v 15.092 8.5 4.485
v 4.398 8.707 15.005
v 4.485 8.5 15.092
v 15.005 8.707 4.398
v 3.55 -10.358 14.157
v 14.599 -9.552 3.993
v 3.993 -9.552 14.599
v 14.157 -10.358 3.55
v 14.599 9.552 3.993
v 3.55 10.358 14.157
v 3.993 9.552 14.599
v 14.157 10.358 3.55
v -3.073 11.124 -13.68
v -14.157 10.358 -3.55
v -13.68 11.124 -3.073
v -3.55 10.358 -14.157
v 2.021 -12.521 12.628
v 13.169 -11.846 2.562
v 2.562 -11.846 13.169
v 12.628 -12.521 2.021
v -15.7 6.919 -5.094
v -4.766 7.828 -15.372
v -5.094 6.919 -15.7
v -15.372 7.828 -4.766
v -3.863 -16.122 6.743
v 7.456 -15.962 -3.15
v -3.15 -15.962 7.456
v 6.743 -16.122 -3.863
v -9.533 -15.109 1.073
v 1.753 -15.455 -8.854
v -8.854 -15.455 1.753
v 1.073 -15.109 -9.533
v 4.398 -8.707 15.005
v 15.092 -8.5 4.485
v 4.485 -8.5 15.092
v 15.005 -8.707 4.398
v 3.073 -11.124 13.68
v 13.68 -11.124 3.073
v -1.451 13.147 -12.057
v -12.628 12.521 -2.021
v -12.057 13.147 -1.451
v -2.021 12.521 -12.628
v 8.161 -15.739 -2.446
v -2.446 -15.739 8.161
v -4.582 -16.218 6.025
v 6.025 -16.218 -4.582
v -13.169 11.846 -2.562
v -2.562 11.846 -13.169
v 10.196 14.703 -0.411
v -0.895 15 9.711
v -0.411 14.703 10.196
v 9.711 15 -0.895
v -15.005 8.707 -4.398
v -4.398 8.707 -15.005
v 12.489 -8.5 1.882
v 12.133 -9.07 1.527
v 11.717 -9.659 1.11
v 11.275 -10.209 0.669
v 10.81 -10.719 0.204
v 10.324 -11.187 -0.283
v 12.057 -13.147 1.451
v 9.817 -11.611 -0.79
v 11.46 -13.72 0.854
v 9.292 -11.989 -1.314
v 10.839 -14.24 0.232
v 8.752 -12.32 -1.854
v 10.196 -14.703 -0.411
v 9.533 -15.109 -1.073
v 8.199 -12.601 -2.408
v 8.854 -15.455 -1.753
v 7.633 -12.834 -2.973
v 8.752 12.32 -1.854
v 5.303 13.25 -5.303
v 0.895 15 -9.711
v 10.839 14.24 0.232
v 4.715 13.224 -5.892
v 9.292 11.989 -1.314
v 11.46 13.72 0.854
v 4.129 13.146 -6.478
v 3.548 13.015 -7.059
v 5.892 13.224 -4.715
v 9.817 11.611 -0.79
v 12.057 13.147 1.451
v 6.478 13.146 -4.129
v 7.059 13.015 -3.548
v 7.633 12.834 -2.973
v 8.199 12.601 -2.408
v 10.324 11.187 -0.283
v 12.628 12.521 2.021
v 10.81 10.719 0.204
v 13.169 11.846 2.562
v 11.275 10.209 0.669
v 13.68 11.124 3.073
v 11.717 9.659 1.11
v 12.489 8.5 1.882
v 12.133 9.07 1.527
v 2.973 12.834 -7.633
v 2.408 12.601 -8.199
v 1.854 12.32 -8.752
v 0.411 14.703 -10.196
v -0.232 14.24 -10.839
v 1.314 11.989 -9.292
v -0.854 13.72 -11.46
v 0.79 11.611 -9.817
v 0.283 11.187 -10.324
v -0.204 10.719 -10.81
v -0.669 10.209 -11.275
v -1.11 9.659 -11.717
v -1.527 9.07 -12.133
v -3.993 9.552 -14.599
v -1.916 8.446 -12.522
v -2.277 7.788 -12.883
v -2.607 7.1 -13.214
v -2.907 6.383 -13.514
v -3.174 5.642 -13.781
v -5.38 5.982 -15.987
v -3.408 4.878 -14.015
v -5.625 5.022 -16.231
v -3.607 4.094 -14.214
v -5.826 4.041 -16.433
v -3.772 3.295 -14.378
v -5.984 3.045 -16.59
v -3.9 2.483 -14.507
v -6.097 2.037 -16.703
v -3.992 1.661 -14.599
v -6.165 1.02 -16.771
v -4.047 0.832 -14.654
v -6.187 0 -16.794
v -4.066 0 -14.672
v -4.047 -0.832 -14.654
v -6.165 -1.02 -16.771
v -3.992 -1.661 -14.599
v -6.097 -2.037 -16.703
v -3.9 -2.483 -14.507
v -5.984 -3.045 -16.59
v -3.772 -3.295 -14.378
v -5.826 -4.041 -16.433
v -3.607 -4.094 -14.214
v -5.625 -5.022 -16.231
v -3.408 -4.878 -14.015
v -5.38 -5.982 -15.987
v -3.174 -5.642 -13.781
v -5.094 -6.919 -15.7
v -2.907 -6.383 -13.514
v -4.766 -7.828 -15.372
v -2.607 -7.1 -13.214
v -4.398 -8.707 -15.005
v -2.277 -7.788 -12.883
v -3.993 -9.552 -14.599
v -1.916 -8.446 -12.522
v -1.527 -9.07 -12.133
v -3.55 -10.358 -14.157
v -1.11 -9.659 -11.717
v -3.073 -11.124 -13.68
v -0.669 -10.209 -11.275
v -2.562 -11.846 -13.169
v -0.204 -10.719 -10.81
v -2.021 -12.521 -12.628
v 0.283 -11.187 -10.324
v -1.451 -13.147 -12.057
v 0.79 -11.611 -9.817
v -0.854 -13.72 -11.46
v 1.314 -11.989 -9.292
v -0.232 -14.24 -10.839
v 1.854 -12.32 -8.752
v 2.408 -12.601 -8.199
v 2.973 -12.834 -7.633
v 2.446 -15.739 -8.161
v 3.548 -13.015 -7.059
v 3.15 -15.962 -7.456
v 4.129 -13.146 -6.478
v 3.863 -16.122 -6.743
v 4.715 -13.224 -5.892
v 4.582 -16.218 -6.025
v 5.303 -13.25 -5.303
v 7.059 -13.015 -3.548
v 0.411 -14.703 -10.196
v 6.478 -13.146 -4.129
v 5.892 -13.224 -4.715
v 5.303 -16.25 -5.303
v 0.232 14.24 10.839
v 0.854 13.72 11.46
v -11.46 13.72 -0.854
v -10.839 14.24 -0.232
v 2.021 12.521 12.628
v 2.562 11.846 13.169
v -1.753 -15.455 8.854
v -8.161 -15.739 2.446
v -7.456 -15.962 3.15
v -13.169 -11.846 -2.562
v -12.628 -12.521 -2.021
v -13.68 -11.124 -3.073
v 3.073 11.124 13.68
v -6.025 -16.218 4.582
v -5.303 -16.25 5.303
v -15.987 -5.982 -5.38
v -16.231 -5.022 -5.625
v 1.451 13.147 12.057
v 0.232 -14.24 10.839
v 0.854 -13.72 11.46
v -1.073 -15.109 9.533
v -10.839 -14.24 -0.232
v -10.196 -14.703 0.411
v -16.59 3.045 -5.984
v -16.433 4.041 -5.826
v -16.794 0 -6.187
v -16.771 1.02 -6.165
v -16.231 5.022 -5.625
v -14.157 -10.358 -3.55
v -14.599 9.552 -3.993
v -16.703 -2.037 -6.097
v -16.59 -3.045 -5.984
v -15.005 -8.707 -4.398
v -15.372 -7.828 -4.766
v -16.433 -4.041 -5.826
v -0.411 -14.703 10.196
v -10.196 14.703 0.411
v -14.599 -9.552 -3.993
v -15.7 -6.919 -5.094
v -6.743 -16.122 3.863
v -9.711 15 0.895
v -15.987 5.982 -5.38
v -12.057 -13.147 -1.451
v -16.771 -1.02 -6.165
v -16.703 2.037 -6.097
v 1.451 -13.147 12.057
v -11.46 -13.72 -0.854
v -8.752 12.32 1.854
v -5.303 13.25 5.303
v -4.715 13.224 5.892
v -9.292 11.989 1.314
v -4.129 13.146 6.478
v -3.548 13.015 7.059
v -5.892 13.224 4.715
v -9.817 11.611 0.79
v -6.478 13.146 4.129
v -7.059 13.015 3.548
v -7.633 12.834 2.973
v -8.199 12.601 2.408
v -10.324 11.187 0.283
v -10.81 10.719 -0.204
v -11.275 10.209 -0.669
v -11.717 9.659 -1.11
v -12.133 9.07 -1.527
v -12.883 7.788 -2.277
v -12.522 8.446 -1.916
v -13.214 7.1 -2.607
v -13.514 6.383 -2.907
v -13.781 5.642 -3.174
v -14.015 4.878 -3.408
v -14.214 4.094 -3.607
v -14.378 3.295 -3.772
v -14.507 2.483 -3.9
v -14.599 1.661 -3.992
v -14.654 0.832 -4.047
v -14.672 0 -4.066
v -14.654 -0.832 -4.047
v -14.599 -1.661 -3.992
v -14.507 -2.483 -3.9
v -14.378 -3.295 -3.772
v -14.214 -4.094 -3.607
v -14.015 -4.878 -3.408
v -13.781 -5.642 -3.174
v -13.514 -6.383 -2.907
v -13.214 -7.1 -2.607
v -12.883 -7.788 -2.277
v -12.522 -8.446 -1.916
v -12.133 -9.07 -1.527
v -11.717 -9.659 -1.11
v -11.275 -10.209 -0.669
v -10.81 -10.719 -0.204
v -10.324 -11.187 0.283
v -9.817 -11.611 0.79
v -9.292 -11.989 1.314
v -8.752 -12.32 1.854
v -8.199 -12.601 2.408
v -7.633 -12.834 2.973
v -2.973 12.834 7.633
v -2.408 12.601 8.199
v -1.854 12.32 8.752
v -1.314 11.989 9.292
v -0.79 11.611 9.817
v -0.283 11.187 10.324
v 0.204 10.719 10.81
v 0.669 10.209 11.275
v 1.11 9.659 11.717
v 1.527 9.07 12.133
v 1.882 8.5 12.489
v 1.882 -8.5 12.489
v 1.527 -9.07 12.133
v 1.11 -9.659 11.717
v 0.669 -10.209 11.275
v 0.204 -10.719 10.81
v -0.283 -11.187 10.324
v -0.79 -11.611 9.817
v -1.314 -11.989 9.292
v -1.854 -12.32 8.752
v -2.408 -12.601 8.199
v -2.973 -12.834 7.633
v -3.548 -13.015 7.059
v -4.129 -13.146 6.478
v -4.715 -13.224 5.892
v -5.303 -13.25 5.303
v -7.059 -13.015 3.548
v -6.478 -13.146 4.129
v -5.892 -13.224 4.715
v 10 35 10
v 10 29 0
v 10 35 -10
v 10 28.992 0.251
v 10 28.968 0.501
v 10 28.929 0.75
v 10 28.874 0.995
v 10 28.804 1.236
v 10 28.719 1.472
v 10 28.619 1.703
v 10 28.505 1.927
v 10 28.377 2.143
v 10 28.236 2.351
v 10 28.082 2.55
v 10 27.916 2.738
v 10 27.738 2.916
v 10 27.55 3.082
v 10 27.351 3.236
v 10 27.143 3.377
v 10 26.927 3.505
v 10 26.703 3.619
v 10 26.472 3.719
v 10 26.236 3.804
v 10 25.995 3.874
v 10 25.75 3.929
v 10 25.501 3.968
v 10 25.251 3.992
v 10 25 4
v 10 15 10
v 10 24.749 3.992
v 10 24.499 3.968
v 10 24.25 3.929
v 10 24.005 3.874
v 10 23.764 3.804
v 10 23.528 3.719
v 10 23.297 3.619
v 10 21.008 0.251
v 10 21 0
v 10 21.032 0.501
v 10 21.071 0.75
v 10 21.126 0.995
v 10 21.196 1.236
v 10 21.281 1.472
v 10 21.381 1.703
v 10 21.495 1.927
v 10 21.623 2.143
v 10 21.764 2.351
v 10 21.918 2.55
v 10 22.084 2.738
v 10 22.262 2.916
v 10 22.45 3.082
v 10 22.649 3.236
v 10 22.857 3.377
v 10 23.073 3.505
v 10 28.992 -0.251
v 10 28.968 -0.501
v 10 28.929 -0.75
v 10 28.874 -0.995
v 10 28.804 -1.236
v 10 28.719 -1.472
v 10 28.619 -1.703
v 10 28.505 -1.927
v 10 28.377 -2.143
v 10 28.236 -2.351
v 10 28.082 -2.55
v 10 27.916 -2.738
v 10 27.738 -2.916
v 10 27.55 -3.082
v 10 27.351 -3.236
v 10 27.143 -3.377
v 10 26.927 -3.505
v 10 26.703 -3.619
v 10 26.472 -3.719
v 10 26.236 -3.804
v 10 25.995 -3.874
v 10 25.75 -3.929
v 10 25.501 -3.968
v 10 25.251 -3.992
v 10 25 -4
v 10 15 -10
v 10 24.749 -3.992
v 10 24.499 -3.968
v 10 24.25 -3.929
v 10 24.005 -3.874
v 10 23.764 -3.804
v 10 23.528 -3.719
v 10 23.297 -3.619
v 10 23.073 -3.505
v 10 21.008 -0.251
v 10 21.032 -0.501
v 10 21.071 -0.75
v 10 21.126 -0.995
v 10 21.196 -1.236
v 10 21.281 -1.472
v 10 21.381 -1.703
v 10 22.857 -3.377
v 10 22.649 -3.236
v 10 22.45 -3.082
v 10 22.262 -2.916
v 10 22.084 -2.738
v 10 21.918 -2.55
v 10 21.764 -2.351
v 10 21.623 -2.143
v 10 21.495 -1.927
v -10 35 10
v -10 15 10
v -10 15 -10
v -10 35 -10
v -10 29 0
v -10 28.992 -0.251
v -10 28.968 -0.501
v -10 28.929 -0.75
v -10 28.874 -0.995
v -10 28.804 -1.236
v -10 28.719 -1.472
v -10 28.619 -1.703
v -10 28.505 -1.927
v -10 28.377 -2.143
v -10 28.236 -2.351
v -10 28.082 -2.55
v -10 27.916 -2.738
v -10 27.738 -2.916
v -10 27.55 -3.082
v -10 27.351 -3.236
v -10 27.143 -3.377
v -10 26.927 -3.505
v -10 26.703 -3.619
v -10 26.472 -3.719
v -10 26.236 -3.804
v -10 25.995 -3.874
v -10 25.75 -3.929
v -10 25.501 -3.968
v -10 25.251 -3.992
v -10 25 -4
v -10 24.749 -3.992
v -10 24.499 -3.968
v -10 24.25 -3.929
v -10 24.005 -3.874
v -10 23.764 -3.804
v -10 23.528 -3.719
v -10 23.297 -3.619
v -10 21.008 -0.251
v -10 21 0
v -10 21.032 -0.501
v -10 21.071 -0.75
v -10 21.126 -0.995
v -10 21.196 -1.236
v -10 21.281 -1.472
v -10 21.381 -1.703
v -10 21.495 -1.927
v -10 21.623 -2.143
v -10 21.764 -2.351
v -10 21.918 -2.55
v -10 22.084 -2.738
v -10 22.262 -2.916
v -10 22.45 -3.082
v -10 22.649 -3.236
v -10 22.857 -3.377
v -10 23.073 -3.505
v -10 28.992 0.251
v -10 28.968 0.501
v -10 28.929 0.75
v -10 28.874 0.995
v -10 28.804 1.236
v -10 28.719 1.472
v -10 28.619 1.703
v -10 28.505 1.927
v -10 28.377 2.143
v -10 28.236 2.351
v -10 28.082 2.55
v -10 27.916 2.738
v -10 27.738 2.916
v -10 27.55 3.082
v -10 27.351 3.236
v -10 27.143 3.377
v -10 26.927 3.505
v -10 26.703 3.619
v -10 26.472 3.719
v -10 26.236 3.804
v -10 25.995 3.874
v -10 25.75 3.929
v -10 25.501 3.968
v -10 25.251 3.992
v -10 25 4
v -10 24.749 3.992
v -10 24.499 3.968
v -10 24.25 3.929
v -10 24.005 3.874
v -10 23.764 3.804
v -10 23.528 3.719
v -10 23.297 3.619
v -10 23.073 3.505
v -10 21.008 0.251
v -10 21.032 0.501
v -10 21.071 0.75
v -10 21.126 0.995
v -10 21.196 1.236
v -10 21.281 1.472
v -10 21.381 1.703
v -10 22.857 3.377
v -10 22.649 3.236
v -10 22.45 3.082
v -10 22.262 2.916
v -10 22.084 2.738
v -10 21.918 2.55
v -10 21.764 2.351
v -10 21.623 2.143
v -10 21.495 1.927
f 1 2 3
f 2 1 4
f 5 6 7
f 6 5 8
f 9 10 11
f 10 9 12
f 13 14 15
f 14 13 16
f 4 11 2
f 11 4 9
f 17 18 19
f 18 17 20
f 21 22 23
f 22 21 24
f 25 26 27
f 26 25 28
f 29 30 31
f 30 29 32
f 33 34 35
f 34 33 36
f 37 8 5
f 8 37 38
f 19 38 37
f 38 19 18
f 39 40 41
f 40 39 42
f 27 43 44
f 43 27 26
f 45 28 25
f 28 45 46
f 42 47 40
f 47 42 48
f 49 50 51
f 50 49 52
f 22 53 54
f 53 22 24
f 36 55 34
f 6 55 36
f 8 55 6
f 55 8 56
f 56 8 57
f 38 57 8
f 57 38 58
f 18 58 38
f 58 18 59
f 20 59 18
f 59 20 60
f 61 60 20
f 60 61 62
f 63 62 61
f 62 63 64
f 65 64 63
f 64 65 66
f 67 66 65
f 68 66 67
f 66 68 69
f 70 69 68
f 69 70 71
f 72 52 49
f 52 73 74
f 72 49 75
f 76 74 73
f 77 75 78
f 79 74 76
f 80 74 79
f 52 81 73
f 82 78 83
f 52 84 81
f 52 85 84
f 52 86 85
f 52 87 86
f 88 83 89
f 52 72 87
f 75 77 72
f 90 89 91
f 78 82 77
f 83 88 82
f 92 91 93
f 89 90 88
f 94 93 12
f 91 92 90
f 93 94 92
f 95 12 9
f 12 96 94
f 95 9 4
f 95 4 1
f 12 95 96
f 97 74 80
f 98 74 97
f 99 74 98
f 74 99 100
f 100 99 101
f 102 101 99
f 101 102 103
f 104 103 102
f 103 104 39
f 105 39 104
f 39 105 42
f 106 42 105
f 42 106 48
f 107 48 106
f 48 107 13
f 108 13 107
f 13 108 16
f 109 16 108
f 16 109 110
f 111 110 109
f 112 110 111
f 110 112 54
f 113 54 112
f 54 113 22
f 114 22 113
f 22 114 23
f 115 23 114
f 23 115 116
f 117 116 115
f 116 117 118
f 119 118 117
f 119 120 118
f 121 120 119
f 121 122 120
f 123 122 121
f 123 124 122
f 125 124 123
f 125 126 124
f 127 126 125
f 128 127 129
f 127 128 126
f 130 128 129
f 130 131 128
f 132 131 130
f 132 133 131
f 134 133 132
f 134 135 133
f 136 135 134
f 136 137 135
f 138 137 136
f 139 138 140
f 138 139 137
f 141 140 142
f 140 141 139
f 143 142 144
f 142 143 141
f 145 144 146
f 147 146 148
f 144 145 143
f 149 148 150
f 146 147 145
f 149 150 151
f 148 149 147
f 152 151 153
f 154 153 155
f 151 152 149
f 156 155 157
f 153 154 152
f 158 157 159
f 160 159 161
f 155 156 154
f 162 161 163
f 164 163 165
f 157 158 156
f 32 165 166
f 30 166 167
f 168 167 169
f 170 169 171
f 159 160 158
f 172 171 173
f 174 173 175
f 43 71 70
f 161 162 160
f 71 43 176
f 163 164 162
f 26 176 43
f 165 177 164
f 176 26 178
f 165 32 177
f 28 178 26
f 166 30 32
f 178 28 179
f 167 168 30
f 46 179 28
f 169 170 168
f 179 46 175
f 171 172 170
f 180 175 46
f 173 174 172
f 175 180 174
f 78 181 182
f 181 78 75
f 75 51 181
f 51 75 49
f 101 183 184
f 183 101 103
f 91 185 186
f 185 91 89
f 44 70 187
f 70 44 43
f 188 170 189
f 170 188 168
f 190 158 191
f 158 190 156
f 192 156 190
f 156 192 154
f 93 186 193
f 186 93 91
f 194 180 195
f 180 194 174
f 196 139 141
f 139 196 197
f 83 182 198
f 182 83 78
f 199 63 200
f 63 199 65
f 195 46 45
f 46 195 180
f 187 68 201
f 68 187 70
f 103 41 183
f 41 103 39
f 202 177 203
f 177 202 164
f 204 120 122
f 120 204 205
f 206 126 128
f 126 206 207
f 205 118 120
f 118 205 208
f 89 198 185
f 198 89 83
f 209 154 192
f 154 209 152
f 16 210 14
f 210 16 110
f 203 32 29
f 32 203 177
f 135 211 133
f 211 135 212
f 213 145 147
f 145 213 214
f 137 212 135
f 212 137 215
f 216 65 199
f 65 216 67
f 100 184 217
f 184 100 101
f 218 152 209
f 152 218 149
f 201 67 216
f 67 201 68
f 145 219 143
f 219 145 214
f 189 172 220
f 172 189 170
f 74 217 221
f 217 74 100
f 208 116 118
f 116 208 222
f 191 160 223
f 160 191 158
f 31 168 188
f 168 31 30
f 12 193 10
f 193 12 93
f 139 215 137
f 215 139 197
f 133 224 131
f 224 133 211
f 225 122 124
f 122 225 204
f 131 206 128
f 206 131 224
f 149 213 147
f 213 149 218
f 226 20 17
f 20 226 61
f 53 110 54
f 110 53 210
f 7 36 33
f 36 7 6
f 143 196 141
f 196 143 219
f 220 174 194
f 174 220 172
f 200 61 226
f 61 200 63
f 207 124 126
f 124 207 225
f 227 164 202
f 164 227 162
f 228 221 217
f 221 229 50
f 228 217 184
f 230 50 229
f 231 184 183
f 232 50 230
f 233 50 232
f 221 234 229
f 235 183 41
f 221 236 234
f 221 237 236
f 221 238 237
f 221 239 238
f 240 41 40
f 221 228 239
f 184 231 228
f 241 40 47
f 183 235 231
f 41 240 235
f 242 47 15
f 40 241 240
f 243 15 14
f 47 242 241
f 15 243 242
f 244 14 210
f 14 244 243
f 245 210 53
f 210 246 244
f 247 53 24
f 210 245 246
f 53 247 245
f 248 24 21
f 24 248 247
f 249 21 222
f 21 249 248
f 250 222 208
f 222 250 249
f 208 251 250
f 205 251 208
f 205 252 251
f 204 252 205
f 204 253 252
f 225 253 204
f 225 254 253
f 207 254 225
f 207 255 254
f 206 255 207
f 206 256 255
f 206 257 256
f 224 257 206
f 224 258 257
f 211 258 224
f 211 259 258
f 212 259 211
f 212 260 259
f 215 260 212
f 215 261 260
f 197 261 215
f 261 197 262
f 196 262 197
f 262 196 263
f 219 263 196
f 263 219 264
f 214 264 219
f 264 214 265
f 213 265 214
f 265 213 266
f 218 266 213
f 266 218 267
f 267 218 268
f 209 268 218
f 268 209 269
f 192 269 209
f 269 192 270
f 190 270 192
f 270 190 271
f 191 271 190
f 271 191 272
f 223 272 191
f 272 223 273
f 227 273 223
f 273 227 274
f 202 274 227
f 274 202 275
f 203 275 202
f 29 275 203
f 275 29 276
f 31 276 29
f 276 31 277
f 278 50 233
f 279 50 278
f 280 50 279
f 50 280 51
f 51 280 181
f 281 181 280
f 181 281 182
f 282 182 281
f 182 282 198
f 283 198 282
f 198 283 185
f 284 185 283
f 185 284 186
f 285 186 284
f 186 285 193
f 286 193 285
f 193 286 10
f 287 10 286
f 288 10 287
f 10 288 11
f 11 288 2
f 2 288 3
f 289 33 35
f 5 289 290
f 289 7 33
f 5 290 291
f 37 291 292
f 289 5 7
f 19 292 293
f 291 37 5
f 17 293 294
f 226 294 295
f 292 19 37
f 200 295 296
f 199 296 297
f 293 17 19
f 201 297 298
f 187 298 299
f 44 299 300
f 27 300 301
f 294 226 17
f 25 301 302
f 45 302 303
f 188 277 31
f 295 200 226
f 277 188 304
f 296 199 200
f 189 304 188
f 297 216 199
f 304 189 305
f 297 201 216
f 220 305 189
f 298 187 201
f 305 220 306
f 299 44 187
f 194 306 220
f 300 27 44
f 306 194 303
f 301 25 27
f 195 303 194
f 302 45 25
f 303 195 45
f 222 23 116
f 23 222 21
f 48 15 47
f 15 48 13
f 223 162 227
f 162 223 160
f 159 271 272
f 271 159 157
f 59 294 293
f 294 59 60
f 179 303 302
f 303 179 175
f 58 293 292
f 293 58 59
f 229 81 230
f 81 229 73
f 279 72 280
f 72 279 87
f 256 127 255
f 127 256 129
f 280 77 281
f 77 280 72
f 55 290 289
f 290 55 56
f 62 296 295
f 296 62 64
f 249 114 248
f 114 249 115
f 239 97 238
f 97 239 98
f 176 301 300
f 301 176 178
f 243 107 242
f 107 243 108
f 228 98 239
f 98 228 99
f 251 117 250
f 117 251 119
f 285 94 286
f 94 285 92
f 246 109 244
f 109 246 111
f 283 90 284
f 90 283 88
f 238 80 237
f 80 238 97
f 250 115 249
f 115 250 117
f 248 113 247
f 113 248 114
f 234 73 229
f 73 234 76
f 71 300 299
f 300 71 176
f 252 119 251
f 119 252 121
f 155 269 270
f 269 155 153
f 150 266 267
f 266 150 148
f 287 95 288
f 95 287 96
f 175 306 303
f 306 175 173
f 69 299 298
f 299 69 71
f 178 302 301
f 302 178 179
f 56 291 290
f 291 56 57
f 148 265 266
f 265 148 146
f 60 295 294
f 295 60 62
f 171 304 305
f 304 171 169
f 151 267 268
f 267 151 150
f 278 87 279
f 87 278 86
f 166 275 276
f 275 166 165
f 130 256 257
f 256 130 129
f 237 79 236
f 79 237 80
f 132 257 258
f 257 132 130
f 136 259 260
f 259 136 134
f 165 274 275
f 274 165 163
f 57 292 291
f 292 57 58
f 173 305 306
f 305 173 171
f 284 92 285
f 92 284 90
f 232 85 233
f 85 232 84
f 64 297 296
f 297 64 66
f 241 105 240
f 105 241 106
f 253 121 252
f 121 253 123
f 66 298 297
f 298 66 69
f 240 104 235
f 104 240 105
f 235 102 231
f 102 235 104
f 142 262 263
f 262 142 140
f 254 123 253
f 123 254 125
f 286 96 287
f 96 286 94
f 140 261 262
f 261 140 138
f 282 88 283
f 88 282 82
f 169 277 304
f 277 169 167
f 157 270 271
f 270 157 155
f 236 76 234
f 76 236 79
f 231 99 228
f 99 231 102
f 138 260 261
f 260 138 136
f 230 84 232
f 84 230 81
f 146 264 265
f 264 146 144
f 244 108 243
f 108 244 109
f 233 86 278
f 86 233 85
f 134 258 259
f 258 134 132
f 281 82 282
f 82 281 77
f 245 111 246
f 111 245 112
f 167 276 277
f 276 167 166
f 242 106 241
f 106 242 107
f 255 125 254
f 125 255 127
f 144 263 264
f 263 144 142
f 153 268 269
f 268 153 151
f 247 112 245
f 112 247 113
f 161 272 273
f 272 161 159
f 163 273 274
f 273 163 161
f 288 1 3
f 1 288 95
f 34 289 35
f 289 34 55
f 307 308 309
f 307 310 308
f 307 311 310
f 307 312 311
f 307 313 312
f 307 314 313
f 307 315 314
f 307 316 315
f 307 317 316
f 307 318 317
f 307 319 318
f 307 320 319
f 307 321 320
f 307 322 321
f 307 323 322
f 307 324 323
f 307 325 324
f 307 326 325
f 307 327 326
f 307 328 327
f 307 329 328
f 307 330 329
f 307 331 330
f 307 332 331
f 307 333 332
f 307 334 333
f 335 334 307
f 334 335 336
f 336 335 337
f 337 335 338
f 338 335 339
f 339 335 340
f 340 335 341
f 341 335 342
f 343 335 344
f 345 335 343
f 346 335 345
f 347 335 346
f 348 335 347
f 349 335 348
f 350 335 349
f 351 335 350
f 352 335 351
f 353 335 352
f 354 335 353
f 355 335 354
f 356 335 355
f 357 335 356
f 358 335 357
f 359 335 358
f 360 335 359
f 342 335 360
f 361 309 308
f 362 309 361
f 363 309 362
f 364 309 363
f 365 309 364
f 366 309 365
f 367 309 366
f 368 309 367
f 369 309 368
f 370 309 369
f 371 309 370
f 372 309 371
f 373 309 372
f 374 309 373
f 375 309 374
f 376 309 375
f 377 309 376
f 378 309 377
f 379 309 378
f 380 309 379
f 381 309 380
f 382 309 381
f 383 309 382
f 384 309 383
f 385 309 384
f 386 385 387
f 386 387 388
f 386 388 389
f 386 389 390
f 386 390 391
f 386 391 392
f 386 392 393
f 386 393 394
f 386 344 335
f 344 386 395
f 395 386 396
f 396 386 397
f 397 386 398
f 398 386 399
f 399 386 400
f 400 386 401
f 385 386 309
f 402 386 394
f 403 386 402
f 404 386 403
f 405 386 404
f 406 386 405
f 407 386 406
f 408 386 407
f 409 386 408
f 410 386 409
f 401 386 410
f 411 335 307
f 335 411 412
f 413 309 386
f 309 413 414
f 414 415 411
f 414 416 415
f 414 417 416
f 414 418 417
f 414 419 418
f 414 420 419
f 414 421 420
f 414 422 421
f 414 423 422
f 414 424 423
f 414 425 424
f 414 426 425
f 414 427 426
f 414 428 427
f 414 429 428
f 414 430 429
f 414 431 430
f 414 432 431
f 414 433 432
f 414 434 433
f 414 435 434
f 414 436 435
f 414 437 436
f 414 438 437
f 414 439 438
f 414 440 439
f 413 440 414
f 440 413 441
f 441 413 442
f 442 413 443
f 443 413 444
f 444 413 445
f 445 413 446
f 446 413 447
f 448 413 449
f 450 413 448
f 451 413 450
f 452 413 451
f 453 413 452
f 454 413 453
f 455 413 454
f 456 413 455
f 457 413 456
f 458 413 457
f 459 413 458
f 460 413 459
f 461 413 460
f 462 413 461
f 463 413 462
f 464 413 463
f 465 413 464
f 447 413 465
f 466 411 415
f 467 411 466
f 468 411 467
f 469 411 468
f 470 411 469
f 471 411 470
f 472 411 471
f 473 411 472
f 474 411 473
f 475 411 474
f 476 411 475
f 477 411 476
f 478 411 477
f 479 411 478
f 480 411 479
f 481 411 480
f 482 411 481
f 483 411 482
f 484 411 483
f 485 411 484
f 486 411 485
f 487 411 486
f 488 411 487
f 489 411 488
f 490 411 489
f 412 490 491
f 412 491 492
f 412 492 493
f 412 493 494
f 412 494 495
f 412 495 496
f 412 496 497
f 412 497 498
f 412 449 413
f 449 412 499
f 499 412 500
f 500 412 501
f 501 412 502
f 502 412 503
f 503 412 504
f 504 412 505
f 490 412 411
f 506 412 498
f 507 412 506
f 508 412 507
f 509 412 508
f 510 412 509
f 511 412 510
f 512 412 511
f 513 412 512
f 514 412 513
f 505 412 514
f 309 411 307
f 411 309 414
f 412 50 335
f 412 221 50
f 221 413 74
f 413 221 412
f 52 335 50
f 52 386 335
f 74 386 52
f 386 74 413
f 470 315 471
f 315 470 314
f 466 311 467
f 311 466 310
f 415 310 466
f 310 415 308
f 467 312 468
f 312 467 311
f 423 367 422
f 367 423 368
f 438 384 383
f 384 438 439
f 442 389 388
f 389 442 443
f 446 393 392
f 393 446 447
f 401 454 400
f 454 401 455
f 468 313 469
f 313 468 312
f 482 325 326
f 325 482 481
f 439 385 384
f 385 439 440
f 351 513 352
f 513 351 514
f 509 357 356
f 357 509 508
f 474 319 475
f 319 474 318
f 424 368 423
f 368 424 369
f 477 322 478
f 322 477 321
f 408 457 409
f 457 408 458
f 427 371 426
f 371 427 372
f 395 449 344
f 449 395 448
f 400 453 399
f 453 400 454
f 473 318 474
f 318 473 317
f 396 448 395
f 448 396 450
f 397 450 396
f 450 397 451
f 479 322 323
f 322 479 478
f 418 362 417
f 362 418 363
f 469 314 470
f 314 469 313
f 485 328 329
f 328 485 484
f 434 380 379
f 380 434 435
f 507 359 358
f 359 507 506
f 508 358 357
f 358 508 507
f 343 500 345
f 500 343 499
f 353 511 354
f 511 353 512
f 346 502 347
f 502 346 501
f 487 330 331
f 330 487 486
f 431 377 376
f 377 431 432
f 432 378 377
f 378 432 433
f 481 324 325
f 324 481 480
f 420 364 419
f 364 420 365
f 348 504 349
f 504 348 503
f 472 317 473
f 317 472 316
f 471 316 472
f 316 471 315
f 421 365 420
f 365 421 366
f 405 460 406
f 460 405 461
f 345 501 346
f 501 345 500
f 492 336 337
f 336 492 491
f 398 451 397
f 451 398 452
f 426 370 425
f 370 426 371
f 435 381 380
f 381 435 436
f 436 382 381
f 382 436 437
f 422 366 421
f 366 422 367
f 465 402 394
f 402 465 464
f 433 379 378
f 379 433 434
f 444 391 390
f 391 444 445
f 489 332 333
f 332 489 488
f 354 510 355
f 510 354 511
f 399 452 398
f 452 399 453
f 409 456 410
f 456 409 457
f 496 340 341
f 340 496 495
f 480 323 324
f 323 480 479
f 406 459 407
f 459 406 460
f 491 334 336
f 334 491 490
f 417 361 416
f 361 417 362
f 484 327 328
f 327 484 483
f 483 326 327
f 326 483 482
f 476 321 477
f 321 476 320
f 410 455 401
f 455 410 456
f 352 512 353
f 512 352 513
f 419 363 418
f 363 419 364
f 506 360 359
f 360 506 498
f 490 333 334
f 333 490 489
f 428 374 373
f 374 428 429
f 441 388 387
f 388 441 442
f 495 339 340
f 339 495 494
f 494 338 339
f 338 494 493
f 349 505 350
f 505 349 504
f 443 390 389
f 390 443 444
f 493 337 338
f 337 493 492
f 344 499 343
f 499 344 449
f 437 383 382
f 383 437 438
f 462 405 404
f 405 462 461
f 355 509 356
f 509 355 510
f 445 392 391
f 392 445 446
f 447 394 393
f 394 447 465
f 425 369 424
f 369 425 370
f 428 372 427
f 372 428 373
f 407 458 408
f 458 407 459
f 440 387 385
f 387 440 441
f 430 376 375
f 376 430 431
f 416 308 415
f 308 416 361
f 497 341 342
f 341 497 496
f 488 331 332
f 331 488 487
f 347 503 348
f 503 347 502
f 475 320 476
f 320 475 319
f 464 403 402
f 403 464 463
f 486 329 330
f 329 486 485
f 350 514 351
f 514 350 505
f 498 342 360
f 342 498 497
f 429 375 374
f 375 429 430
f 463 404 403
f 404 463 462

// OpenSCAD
$fn = 100;
wall = 3;
torch_d = 26.5;

rotate([0,-45,0])
{
    difference()
    {
        cylinder(h=15, d=torch_d+wall+wall, center=true);
        cylinder(h=17, d=torch_d, center=true);
        translate([12,0,0]) cube(size=17, center=true);
    }
}

translate([0,25,0])
{
    difference()
    {
        cube(size=20, center=true);
        rotate([90,0,90]) cylinder(h=32, d=8, center=true);
    }
}
